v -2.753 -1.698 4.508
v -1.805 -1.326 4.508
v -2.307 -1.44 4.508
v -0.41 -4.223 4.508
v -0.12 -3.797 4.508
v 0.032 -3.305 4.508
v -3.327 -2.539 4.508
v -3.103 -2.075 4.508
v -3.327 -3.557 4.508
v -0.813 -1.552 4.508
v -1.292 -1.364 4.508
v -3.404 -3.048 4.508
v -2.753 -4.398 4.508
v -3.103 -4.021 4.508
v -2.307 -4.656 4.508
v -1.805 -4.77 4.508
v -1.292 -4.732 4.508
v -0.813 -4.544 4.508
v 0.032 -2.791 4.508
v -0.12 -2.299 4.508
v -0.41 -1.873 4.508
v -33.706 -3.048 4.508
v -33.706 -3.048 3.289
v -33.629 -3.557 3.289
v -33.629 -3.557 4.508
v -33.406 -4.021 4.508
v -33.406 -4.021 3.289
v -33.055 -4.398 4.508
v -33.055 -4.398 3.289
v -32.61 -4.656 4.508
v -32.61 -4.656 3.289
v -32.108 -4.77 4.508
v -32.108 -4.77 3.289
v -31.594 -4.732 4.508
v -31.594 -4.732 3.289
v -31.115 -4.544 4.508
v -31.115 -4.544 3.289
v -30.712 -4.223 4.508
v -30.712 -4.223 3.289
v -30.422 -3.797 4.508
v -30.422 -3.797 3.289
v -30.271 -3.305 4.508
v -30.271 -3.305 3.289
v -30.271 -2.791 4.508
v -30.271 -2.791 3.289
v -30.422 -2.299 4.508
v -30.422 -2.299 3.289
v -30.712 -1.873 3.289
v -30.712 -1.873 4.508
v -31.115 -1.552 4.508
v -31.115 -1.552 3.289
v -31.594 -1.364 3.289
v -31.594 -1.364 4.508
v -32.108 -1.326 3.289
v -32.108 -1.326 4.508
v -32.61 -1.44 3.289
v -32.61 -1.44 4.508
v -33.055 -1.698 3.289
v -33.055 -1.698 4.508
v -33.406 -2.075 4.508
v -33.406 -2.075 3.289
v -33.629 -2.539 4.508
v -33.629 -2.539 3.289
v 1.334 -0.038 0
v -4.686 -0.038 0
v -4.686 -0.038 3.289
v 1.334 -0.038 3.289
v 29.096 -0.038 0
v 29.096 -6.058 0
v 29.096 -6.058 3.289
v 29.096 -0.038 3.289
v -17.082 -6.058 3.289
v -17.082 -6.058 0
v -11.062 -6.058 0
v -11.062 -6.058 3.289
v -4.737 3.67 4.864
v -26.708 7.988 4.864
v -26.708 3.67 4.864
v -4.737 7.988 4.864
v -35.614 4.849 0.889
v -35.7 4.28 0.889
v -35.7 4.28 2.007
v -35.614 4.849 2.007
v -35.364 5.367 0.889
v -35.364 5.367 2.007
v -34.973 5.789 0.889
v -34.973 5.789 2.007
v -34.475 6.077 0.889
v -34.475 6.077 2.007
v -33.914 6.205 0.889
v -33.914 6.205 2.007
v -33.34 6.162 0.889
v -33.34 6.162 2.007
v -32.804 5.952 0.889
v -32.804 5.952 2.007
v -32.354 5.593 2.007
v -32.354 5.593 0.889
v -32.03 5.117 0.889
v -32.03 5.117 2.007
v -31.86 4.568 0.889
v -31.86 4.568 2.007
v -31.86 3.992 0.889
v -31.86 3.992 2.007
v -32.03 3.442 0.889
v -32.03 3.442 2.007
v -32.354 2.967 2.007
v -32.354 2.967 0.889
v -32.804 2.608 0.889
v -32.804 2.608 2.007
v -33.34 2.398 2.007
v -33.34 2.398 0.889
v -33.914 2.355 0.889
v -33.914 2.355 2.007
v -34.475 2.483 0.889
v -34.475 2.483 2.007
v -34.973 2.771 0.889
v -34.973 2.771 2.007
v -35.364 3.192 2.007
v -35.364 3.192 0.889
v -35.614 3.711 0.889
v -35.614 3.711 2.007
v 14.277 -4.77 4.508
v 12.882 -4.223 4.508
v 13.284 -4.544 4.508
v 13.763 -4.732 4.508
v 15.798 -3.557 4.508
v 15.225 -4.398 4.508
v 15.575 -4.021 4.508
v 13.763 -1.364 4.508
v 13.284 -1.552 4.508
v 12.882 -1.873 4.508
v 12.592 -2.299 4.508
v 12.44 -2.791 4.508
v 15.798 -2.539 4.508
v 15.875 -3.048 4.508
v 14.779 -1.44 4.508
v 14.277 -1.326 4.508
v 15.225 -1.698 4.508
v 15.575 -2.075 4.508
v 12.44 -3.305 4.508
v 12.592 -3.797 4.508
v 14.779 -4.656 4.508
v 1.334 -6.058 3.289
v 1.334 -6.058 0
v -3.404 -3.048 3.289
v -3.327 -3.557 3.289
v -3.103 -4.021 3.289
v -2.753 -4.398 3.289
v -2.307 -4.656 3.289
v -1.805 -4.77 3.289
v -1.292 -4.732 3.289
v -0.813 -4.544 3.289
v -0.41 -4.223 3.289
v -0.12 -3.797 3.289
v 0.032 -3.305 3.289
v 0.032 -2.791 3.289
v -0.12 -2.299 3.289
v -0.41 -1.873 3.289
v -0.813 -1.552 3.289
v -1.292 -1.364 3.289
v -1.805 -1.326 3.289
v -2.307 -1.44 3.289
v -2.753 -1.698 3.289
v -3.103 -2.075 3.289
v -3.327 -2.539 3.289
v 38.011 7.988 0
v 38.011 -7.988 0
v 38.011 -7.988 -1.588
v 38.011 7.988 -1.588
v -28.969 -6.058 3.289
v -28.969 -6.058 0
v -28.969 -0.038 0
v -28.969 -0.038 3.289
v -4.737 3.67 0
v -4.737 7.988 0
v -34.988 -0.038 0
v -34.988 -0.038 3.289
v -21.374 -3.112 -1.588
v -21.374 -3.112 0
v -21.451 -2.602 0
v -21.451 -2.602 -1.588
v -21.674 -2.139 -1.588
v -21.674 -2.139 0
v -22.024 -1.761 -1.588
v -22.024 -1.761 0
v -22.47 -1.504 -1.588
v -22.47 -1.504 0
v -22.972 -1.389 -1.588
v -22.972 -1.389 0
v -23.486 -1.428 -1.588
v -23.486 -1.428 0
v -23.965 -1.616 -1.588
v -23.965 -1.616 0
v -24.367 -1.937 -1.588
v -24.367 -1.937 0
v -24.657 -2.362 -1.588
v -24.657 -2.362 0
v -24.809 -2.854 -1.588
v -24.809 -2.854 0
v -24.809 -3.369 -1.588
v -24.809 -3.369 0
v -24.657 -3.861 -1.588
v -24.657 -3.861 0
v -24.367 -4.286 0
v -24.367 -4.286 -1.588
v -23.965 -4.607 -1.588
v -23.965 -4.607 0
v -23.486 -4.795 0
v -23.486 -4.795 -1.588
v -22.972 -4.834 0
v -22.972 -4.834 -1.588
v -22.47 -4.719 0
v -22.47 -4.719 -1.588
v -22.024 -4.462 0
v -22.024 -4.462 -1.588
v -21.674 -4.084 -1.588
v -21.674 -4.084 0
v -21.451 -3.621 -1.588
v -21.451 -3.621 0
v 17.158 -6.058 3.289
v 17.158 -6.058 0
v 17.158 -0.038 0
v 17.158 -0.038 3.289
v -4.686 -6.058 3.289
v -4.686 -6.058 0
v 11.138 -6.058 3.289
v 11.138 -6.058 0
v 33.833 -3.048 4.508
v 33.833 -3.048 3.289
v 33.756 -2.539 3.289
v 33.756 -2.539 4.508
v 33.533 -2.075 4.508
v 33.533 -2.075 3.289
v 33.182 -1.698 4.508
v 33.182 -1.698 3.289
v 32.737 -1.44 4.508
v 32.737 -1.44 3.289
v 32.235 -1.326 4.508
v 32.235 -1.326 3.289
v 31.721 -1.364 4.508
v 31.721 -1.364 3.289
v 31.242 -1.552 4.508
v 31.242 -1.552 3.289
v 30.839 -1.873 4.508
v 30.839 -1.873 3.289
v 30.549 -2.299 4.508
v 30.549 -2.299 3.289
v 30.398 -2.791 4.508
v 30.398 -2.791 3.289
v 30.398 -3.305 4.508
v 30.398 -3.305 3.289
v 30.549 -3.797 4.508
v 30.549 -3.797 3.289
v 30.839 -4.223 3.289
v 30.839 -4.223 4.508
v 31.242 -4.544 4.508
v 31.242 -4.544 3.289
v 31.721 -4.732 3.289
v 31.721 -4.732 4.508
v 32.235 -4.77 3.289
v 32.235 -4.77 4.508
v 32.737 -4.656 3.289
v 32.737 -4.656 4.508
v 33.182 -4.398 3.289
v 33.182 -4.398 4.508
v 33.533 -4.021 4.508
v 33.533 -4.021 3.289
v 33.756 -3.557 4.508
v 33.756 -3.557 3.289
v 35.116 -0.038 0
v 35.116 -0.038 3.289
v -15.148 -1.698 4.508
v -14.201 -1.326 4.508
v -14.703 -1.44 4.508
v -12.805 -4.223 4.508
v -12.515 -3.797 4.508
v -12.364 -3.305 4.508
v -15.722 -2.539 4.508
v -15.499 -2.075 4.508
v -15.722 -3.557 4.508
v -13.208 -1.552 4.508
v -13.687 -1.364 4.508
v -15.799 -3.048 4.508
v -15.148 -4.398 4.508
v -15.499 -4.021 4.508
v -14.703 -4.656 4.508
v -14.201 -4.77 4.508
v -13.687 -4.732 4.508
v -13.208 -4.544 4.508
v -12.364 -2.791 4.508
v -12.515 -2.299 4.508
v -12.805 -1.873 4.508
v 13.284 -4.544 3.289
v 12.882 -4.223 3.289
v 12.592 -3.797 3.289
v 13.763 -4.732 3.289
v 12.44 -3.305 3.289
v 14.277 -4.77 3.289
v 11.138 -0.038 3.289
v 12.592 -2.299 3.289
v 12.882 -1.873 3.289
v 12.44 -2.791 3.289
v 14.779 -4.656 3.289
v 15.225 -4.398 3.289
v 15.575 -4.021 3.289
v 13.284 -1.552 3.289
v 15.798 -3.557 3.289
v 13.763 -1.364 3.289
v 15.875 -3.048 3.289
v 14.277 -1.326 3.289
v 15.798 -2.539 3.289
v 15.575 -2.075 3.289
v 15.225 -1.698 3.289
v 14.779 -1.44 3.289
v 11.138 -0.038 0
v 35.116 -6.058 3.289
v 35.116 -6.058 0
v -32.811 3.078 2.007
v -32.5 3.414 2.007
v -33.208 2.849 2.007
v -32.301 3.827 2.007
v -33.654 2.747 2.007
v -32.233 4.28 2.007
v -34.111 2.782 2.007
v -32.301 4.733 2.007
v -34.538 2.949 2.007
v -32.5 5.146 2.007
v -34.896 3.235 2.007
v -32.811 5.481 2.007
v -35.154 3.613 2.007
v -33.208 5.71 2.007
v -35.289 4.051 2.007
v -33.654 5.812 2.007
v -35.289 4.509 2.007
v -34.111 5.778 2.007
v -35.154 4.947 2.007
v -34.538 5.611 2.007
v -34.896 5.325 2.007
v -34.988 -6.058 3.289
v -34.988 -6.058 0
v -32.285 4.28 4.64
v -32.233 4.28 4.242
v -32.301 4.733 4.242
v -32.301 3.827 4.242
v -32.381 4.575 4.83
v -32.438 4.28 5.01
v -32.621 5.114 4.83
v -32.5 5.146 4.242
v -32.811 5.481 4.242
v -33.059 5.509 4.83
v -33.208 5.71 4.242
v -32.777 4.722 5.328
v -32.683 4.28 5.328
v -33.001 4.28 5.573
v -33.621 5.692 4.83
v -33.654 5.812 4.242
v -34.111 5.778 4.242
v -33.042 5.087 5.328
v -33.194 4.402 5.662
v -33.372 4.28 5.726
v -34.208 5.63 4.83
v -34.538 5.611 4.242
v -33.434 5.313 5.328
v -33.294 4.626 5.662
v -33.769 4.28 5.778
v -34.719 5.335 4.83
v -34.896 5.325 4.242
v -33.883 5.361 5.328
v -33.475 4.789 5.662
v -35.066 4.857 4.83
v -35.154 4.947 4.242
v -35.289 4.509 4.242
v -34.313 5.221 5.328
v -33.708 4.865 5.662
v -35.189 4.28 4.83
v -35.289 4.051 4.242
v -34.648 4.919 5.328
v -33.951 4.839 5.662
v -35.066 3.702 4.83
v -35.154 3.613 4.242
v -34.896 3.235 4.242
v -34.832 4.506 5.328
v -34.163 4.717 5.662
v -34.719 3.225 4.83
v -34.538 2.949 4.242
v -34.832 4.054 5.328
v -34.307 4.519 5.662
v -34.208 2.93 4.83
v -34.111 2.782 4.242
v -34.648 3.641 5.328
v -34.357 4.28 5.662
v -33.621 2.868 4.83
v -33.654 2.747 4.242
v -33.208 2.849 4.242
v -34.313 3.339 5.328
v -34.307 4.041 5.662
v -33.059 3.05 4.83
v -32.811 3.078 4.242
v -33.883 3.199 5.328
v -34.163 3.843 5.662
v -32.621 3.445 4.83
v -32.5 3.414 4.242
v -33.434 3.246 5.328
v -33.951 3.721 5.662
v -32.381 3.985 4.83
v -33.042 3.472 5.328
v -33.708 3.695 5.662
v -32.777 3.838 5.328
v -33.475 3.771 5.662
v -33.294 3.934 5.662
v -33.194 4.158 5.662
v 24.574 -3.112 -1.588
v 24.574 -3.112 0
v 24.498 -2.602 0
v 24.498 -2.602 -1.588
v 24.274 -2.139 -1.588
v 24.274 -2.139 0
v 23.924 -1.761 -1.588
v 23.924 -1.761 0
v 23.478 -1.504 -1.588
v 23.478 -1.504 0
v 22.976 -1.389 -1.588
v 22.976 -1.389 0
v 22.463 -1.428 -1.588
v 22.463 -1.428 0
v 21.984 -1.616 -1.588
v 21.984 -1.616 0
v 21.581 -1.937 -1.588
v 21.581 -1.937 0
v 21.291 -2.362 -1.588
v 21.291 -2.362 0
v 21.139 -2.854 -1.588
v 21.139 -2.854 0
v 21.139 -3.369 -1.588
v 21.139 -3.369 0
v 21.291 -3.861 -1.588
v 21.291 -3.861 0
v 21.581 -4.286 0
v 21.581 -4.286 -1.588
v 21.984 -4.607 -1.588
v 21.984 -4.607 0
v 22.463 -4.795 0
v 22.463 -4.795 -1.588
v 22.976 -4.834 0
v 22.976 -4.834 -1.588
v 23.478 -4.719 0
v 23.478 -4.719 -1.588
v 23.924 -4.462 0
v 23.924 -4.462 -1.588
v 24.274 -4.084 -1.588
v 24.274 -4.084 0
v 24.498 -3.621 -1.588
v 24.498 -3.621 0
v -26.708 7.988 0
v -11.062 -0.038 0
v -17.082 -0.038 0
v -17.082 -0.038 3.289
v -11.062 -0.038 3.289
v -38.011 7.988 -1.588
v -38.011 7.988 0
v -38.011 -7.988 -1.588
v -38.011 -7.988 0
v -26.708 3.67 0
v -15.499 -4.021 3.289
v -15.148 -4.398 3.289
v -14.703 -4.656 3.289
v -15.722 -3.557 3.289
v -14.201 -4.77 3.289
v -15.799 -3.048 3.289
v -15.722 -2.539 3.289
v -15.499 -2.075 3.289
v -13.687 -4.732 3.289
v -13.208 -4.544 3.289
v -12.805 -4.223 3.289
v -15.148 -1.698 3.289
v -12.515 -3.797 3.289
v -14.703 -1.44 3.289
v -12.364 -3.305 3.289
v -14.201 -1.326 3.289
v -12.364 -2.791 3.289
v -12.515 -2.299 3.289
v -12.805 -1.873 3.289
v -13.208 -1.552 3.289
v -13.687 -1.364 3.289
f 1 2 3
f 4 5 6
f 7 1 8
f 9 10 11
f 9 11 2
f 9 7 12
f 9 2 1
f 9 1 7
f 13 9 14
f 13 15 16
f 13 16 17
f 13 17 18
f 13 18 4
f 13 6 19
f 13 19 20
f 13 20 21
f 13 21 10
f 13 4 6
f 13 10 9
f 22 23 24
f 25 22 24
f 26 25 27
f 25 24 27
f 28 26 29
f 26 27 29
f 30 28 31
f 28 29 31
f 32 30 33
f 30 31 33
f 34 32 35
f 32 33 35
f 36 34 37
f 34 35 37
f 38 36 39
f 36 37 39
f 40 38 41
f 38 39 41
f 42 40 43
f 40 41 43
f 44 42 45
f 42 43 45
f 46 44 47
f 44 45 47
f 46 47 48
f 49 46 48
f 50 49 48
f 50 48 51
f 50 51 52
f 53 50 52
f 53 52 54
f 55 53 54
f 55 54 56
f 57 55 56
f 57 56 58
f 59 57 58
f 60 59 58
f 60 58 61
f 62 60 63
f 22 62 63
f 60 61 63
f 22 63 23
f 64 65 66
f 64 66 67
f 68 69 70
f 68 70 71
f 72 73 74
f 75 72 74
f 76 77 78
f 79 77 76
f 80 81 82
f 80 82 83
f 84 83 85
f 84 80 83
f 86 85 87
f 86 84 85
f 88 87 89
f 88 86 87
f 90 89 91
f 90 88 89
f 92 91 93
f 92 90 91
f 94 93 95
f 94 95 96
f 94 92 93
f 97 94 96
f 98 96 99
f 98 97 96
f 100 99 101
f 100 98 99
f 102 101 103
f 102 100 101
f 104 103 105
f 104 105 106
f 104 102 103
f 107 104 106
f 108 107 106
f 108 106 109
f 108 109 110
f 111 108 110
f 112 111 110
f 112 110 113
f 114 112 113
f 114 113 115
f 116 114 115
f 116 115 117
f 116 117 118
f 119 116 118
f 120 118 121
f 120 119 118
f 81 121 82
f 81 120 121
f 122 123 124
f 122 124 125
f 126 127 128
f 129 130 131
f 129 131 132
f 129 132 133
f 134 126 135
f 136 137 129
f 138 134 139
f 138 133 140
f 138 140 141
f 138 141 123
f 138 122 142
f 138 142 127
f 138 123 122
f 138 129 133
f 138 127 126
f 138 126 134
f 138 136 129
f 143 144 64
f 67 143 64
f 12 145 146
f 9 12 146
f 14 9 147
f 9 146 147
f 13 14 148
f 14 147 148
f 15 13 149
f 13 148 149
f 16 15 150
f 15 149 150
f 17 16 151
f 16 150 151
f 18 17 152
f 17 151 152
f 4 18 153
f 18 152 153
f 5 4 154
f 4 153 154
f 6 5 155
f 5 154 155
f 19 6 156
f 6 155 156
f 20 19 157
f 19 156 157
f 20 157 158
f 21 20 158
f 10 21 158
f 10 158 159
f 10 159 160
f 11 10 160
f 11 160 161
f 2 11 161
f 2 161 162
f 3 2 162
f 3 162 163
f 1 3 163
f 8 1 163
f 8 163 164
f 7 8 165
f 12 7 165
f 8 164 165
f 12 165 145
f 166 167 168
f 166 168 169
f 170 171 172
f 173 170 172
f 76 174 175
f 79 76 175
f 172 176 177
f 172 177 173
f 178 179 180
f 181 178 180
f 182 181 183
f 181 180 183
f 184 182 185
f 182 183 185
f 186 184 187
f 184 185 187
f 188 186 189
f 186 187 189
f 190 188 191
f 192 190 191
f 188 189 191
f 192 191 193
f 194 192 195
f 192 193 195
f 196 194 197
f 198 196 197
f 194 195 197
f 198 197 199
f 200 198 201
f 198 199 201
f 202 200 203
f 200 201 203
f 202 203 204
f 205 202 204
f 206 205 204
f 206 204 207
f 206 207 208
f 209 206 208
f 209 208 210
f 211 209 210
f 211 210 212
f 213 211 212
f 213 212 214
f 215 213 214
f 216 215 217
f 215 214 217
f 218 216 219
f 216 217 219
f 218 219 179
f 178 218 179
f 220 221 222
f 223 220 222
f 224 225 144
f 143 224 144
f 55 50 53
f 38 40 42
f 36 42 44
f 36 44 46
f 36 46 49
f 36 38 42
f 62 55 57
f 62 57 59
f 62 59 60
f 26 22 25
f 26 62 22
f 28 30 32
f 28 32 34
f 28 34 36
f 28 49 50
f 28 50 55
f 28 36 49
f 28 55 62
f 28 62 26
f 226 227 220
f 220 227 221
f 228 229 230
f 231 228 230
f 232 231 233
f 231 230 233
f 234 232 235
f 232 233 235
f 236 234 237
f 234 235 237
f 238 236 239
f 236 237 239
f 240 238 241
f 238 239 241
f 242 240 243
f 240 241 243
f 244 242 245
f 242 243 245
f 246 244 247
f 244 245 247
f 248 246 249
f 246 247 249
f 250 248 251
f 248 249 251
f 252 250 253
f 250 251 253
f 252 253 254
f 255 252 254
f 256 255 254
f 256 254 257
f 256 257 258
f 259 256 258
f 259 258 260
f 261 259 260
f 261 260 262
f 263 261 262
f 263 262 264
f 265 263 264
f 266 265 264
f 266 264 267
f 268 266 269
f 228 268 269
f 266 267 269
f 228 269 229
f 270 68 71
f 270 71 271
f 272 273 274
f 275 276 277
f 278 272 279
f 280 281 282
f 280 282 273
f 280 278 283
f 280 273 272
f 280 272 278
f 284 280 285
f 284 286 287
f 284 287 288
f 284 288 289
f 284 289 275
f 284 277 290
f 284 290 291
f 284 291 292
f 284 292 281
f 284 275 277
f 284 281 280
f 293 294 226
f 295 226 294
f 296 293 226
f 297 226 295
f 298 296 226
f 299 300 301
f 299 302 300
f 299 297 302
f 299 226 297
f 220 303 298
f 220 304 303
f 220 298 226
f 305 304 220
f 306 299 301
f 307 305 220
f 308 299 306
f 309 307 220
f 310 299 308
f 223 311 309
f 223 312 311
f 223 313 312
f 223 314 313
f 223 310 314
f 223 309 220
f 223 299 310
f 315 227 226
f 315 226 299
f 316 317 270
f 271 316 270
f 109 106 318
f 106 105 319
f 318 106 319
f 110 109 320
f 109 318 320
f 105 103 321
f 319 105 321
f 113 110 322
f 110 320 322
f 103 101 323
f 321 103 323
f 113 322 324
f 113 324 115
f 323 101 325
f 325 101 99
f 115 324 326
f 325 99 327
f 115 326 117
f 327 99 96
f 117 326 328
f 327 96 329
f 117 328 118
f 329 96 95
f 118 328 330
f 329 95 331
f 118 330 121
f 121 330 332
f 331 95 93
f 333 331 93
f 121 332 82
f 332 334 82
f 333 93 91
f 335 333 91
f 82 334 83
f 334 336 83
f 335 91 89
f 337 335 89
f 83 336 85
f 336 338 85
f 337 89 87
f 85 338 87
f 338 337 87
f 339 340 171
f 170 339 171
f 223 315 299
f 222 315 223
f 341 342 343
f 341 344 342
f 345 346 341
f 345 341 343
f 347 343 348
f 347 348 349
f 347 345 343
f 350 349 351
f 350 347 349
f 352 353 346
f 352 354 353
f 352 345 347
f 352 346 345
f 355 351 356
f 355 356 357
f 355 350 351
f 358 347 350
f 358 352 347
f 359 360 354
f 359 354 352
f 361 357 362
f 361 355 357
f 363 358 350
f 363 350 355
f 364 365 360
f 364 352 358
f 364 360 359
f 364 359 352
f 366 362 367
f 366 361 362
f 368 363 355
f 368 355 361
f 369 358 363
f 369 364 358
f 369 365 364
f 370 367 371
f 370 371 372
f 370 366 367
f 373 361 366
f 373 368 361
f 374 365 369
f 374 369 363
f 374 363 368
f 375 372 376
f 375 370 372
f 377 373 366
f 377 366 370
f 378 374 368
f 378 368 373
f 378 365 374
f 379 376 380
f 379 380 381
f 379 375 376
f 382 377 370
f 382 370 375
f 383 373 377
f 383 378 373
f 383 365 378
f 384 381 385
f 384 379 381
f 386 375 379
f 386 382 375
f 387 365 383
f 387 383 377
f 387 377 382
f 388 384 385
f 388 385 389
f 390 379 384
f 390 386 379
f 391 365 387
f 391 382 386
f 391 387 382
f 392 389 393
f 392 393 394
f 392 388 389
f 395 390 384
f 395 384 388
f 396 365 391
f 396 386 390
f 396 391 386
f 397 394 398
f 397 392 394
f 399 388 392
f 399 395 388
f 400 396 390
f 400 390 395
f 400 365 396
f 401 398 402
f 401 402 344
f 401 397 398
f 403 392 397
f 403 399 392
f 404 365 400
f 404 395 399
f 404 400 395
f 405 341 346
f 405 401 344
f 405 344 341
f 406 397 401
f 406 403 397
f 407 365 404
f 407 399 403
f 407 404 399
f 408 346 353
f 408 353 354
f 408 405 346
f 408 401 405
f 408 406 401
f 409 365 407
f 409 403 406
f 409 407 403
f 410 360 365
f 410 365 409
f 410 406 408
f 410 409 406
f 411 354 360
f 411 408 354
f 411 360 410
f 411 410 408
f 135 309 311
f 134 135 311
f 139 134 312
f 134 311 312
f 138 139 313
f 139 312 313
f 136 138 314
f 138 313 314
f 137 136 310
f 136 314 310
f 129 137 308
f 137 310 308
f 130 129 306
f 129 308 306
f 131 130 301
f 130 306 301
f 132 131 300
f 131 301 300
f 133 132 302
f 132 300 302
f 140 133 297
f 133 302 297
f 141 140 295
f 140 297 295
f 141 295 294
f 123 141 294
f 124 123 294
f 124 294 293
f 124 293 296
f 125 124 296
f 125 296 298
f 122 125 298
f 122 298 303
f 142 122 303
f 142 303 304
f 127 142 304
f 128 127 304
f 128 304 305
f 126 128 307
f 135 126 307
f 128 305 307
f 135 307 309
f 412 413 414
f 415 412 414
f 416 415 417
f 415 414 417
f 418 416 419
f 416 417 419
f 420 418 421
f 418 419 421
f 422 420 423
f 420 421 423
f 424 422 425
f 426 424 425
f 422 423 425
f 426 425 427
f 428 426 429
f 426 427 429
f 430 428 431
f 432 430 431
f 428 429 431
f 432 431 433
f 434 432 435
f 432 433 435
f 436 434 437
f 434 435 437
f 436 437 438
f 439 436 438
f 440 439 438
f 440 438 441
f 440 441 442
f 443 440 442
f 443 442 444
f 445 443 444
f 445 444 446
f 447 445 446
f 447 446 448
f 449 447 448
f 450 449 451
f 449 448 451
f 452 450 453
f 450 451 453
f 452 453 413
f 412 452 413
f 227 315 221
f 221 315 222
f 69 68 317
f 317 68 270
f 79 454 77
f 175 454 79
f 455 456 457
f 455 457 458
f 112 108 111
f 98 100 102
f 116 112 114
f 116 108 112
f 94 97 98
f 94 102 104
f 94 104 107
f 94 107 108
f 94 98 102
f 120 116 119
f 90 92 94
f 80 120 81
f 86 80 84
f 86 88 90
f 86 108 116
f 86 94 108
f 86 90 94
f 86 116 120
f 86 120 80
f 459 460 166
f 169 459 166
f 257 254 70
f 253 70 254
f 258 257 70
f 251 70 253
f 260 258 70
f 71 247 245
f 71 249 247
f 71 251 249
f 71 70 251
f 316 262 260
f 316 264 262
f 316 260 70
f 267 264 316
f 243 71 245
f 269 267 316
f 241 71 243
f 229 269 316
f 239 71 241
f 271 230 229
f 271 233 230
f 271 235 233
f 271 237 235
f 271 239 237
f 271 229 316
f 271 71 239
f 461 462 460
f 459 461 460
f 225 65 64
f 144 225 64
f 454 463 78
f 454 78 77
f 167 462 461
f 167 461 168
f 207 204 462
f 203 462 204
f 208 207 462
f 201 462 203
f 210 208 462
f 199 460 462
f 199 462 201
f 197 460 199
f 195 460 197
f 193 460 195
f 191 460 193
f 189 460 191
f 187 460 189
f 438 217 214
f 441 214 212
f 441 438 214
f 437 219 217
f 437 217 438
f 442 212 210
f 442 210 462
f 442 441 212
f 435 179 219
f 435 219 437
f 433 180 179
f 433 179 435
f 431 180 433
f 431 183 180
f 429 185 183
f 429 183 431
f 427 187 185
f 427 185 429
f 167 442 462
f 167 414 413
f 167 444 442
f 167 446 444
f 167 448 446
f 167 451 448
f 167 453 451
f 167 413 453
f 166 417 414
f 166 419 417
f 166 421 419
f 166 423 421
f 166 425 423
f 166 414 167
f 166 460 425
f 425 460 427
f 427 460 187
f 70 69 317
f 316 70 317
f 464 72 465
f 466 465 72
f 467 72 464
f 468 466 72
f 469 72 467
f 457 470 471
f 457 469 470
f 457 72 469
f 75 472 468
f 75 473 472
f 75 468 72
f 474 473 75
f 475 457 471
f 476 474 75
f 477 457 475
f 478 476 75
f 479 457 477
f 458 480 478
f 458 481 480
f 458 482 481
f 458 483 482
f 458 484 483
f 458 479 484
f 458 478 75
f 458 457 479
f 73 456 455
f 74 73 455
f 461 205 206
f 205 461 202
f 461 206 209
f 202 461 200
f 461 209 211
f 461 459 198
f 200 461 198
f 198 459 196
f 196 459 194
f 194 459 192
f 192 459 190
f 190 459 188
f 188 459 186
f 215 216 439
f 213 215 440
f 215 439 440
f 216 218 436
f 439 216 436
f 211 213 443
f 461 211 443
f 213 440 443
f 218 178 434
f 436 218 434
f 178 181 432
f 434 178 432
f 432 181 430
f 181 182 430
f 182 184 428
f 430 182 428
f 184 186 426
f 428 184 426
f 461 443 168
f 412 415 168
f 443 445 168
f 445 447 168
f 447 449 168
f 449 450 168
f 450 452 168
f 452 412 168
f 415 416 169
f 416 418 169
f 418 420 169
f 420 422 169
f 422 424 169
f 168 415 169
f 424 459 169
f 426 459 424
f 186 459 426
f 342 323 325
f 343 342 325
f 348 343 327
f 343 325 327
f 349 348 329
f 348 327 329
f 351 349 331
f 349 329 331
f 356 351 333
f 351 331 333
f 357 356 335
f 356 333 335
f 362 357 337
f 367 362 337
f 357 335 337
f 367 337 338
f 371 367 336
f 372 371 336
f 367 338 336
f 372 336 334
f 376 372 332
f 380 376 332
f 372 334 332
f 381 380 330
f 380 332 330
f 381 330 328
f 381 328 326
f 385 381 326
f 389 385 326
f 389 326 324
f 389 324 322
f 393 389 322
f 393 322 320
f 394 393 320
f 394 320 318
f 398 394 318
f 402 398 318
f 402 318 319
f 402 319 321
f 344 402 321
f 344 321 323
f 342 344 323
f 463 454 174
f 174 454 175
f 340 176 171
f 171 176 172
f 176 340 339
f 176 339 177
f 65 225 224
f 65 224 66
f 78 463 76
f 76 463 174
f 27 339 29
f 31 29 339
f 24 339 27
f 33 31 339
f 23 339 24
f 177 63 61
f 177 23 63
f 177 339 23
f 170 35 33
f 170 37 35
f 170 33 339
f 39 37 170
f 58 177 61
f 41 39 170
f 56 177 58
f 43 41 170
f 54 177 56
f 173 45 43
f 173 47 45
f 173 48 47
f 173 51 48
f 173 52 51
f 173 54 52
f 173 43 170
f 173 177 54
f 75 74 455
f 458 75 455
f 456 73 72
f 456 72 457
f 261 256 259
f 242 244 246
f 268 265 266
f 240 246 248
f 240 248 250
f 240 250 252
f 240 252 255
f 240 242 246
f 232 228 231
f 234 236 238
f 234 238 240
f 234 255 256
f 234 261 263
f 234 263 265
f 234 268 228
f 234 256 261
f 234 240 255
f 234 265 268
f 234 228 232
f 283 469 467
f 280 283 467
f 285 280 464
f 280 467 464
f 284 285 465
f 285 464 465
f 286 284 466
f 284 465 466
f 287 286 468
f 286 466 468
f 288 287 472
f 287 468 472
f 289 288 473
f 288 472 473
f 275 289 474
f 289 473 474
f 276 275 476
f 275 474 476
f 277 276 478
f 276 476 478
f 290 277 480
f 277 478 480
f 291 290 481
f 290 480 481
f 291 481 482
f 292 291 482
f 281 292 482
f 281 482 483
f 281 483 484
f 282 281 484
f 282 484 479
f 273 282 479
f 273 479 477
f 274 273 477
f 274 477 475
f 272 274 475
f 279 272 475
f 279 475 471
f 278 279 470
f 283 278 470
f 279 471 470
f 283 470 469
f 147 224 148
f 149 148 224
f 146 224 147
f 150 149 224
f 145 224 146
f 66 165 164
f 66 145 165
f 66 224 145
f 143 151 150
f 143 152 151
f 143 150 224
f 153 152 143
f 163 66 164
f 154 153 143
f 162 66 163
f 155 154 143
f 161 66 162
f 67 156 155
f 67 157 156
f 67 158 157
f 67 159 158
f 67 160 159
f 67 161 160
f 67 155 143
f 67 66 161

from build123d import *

# Parameters (mm, degrees)
SKETCH2_W             = 76.0222
SKETCH2_H             = 15.9766
SKETCH2_R             = 1.7272
BOSS_EXTRUDE1_DEPTH   = 1.5875
SKETCH3_W             = 6.0198
SKETCH3_H             = 6.0198
BOSS_EXTRUDE2_DEPTH   = 3.2893
BOSS_EXTRUDE2_2_DEPTH = 3.2893
BOSS_EXTRUDE2_3_DEPTH = 3.2893
BOSS_EXTRUDE2_4_DEPTH = 3.2893
BOSS_EXTRUDE2_5_DEPTH = 3.2893
SKETCH4_R             = 1.7272
BOSS_EXTRUDE3_DEPTH   = 1.2192
SKETCH5_W             = 21.971
SKETCH5_H             = 4.318
BOSS_EXTRUDE4_DEPTH   = 4.8641
BOSS_EXTRUDE5_START   = 0.889
SKETCH6_R             = 1.5367
BOSS_EXTRUDE5_DEPTH   = 3.3528
DOME1_FACE_RADIUS     = 1.5367
DOME1_HEIGHT          = 1.5367
SKETCH7_R             = 1.9304
BOSS_EXTRUDE6_DEPTH   = 1.1176


with BuildPart() as part:
    # Sketch2 → Boss-Extrude1 (new body)
    with BuildSketch(Plane.XY):
        Rectangle(SKETCH2_W, SKETCH2_H)
        with Locations((-23.1013, -3.1115)):
            Circle(SKETCH2_R, mode=Mode.SUBTRACT)
        with Locations((22.8473, -3.1115)):
            Circle(SKETCH2_R, mode=Mode.SUBTRACT)
    extrude(amount=-BOSS_EXTRUDE1_DEPTH)


with BuildPart() as body_2:
    # Sketch3 → Boss-Extrude2 (new body)
    with BuildSketch(Plane.XY):
        with Locations((-31.9786, -3.048)):
            Rectangle(SKETCH3_W, SKETCH3_H)
    extrude(amount=BOSS_EXTRUDE2_DEPTH)



with BuildPart() as body_3:
    # Sketch3 → Boss-Extrude2 2 (new body)
    with BuildSketch(Plane.XY):
        with Locations((-14.0716, -3.048)):
            Rectangle(SKETCH3_W, SKETCH3_H)
    extrude(amount=BOSS_EXTRUDE2_2_DEPTH)


with BuildPart() as body_4:
    # Sketch3 → Boss-Extrude2 3 (new body)
    with BuildSketch(Plane.XY):
        with Locations((-1.6764, -3.048)):
            Rectangle(SKETCH3_W, SKETCH3_H)
    extrude(amount=BOSS_EXTRUDE2_3_DEPTH)


with BuildPart() as body_5:
    # Sketch3 → Boss-Extrude2 4 (new body)
    with BuildSketch(Plane.XY):
        with Locations((14.1478, -3.048)):
            Rectangle(SKETCH3_W, SKETCH3_H)
    extrude(amount=BOSS_EXTRUDE2_4_DEPTH)


with BuildPart() as body_6:
    # Sketch3 → Boss-Extrude2 5 (new body)
    with BuildSketch(Plane.XY):
        with Locations((32.1056, -3.048)):
            Rectangle(SKETCH3_W, SKETCH3_H)
    extrude(amount=BOSS_EXTRUDE2_5_DEPTH)


with BuildPart() as body_2_1:
    add(body_2.part)

    add(body_3.part)  # Boss-Extrude3 merges body 3

    add(body_4.part)  # Boss-Extrude3 merges body 4

    add(body_5.part)  # Boss-Extrude3 merges body 5

    add(body_6.part)  # Boss-Extrude3 merges body 6
    # Sketch4 → Boss-Extrude3 (add)
    with BuildSketch(Plane.XY.offset(3.2893)):
        with Locations(Location((-31.9786, -3.048, 0), (0, 0, 180))):
            Circle(SKETCH4_R)
        with Locations(Location((-14.0716, -3.048, 0), (0, 0, 180))):
            Circle(SKETCH4_R)
        with Locations(Location((-1.6764, -3.048, 0), (0, 0, 180))):
            Circle(SKETCH4_R)
        with Locations((14.1478, -3.048)):
            Circle(SKETCH4_R)
        with Locations((32.1056, -3.048)):
            Circle(SKETCH4_R)
    extrude(amount=BOSS_EXTRUDE3_DEPTH)


with BuildPart() as body_3_2:
    # Sketch5 → Boss-Extrude4 (new body)
    with BuildSketch(Plane.XY):
        with Locations((-15.7226, 5.8293)):
            Rectangle(SKETCH5_W, SKETCH5_H)
    extrude(amount=BOSS_EXTRUDE4_DEPTH)


with BuildPart() as body_4_2:
    # Sketch6 → Boss-Extrude5 (new body)
    with BuildSketch(Plane.XY.offset(BOSS_EXTRUDE5_START)):
        with Locations((-33.7693, 4.2799)):
            Circle(SKETCH6_R)
    extrude(amount=BOSS_EXTRUDE5_DEPTH)

    # Dome1: a dome of height H over a round flat face of radius A is a cap of a sphere of radius (A * A + H * H) / (2 * H)
    dome1_r = (DOME1_FACE_RADIUS * DOME1_FACE_RADIUS + DOME1_HEIGHT * DOME1_HEIGHT) / (2 * DOME1_HEIGHT)
    dome1_base = Plane((-33.7693, 4.2799, 4.2418), z_dir=(0, 0, 1))
    with Locations(dome1_base.offset(DOME1_HEIGHT - dome1_r)):
        dome1_ball = Sphere(dome1_r, mode=Mode.PRIVATE)
    add(split(dome1_ball, bisect_by=dome1_base, keep=Keep.TOP, mode=Mode.PRIVATE))

    # Sketch7 → Boss-Extrude6 (add)
    with BuildSketch(Plane(origin=(0, 0, 0.889), x_dir=(-1, 0, 0), z_dir=(0, 0, -1))):
        with Locations((33.7693, 4.2799)):
            Circle(SKETCH7_R)
    extrude(amount=-BOSS_EXTRUDE6_DEPTH)


solid = Compound([part.part, body_2_1.part, body_3_2.part, body_4_2.part])
